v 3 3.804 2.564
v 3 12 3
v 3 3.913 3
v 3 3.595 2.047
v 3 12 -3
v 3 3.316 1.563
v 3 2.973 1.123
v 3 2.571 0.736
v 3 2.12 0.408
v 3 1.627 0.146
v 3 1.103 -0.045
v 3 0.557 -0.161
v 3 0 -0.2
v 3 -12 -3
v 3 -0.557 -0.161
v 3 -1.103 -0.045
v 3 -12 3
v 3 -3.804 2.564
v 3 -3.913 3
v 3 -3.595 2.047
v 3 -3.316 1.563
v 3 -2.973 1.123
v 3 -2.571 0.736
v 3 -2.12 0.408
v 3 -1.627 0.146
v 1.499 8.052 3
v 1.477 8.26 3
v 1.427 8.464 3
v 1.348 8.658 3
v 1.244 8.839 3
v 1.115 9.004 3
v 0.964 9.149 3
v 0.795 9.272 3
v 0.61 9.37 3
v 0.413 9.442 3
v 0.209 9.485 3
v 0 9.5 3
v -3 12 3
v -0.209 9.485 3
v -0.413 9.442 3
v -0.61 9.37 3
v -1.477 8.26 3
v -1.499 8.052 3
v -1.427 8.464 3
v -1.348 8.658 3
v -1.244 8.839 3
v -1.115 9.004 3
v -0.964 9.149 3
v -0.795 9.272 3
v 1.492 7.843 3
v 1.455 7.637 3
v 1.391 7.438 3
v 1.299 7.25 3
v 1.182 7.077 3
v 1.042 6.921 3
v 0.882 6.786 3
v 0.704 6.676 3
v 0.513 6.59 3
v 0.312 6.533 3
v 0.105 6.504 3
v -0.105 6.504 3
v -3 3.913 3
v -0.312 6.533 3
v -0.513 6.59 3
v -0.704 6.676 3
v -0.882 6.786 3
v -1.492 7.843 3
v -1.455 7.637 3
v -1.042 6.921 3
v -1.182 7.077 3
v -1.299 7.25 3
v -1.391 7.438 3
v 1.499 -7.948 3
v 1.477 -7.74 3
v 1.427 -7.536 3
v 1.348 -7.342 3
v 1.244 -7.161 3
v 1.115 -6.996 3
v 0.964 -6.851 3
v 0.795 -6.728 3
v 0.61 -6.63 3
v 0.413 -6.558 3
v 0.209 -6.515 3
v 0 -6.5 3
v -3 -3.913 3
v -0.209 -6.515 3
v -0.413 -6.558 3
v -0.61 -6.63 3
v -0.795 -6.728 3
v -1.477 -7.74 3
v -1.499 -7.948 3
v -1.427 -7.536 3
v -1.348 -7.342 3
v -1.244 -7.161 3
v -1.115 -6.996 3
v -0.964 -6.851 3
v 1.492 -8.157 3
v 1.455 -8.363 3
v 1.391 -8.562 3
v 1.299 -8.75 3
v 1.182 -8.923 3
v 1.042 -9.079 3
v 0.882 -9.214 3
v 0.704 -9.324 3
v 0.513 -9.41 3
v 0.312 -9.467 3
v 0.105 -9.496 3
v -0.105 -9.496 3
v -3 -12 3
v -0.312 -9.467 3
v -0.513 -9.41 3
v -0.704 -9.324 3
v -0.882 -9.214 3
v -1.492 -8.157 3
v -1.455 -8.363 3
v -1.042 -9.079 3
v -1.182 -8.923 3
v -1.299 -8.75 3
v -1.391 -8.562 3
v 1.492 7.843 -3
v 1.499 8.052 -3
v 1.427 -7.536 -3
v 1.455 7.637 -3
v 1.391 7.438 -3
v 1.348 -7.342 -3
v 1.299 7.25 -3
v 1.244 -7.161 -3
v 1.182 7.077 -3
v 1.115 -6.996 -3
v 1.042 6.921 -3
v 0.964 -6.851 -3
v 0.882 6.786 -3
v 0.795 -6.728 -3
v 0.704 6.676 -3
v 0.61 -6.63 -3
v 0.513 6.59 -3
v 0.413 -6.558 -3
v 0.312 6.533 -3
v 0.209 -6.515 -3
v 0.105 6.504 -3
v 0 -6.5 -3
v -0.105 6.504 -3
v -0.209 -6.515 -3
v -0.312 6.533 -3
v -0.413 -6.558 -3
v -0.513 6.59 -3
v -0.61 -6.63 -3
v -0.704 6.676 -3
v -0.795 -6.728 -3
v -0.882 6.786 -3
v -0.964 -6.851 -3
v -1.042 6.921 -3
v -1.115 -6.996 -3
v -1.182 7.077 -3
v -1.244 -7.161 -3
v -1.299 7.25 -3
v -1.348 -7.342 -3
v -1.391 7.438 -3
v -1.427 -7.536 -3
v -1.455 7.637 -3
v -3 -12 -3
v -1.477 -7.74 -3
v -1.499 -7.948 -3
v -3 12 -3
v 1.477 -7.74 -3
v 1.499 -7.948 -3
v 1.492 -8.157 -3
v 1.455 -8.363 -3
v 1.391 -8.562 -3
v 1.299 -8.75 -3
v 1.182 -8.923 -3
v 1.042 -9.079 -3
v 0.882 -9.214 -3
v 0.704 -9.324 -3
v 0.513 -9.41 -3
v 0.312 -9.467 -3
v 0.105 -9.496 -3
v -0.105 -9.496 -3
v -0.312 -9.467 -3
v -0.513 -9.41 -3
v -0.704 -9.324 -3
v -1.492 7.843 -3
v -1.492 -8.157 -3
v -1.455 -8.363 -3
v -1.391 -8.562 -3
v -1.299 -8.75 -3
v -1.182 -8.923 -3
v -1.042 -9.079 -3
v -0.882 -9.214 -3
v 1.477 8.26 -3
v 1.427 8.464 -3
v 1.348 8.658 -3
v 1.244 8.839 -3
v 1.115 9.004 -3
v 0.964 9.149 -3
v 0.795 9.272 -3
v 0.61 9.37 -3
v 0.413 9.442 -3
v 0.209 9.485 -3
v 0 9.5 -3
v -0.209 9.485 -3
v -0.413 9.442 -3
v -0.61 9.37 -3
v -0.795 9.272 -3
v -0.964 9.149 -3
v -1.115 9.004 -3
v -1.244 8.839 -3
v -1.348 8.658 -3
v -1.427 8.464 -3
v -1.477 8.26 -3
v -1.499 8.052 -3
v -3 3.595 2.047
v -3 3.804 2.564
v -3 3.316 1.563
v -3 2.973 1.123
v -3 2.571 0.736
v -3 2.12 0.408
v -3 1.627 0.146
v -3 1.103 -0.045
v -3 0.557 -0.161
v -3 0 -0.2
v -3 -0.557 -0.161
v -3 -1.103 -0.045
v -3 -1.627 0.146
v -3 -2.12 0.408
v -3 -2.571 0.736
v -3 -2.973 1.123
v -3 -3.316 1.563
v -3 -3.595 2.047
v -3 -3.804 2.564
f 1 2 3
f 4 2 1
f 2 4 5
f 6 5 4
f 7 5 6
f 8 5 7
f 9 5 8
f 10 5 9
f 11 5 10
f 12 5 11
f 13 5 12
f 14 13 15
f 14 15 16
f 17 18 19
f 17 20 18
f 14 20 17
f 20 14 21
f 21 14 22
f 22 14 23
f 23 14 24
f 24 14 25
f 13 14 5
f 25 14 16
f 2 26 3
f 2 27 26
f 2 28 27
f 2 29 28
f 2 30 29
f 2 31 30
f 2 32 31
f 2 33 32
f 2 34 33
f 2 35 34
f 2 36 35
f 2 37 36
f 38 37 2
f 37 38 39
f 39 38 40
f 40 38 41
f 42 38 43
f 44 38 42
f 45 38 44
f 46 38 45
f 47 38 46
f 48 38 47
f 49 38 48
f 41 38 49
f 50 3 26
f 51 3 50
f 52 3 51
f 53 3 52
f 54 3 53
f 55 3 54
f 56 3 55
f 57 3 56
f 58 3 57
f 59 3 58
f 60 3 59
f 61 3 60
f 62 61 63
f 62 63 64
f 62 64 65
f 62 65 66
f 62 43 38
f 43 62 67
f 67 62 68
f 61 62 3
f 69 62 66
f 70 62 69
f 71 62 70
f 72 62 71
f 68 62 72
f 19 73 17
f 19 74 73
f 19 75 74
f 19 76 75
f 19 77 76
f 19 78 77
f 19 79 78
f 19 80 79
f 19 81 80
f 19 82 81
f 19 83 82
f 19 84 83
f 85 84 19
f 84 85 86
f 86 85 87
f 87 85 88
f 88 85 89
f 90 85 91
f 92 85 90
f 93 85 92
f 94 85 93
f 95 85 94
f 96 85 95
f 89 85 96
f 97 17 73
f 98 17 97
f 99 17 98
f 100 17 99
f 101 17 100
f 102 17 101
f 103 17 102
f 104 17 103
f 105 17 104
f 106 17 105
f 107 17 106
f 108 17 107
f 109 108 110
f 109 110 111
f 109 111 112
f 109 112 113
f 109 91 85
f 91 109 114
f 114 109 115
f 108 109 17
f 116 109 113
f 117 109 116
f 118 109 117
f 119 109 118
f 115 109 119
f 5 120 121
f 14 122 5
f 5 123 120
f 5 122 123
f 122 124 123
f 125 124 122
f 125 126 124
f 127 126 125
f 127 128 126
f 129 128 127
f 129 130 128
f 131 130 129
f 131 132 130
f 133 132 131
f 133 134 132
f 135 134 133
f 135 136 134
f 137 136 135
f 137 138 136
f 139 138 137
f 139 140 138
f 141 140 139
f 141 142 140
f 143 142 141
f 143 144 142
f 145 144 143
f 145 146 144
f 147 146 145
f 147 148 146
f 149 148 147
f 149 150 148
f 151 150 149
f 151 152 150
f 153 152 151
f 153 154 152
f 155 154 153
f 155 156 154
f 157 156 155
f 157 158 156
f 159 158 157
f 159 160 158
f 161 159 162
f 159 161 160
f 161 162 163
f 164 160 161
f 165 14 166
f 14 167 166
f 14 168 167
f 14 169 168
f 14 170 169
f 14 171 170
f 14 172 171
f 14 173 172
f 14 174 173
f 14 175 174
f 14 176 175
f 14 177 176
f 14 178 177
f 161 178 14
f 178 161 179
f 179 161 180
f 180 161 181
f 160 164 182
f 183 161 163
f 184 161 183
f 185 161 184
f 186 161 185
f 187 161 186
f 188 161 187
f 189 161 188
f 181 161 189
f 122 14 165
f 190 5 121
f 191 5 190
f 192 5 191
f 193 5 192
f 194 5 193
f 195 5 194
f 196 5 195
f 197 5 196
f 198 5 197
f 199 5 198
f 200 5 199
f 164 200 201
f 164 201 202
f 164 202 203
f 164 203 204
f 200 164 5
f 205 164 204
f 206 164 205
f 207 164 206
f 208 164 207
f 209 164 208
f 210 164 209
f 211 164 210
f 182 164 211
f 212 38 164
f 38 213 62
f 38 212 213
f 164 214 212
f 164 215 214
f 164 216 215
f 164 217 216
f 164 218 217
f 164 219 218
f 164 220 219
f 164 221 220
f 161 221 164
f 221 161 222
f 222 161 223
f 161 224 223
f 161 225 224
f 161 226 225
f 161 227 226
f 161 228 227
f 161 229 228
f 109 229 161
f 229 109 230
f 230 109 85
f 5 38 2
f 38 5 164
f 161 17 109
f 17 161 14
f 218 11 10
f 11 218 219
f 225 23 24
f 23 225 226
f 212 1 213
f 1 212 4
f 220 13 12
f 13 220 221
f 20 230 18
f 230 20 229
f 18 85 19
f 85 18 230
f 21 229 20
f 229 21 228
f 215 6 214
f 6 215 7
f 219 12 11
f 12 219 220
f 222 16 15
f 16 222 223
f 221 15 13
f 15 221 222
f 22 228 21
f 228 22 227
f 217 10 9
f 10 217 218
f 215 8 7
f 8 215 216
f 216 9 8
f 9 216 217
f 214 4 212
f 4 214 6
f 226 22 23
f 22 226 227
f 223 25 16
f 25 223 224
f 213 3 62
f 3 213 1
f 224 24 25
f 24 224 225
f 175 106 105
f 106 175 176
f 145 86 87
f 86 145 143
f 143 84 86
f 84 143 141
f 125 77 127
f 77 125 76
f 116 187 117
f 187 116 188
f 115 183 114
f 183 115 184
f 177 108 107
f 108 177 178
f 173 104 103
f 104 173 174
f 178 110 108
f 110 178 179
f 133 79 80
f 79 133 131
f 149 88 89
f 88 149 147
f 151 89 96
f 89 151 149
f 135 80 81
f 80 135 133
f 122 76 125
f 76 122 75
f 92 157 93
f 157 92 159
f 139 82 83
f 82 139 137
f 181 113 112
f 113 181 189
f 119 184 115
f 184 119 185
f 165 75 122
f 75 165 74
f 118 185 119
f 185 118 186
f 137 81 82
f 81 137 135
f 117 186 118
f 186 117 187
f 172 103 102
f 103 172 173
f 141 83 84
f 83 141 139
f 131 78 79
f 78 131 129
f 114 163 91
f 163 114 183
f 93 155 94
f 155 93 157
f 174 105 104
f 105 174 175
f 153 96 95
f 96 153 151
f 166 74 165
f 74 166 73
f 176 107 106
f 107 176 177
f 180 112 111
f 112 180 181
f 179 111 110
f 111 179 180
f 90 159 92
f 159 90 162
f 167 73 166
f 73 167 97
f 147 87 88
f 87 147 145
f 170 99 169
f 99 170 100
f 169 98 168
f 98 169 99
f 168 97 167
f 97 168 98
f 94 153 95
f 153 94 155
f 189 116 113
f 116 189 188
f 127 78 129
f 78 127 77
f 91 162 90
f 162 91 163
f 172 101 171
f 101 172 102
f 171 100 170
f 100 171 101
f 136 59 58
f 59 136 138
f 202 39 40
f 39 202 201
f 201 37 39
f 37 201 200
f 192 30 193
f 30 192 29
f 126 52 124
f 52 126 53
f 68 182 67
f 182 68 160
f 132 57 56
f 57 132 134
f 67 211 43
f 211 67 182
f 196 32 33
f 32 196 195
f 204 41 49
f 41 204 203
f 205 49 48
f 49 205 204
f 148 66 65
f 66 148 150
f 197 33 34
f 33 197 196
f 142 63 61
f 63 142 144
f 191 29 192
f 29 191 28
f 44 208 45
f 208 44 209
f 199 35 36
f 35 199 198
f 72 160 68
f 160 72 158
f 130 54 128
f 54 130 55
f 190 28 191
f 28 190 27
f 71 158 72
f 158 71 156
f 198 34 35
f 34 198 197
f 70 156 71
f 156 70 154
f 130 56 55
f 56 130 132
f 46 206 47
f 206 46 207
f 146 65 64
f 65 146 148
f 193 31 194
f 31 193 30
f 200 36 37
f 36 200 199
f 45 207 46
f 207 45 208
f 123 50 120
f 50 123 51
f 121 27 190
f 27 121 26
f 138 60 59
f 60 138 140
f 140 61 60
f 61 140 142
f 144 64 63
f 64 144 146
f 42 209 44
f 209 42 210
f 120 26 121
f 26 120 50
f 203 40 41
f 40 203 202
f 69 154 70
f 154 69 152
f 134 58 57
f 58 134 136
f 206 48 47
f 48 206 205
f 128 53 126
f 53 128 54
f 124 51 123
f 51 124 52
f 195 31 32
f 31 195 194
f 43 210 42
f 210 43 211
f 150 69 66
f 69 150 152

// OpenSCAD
//*** Parametric cable clamp ***
//Bertrand Achard - December 21st 2012 - Creative Common attribution share alike.

//You can use two of them screwed together, or use one attached to the frame.
//The design assumes that the diameter of the screws is smaller than the cable.

//Diameter of the cable
cable_diam=8;
//Diameter of the 2 screws
screw_diam=3;
//How much you want the cable to be "pressed"
cable_press=cable_diam*0.1;

//The height of the cube (z axis)
cube_z=cable_diam*1.5;
//The depth of the cube (x axis), min=screw_diam+some margin
cube_x=screw_diam*4;
//The width of the cube (y axis), min=6
cube_y=cable_diam*6;

difference()
{
	cube([cube_x/2,cube_y/2,cube_z/2], true);

	translate([0,0,cube_z/4+cable_press])
		rotate([0,90,0])
			cylinder(h=cube_x, r1=cable_diam/2, r2=cable_diam/2, center=true, $fn=screw_diam*15);


	translate([0,-cube_y/8-cable_diam/4,0])
		rotate([0,0,90])
			cylinder(h=cube_z, r1=screw_diam/2, r2=screw_diam/2, center=true, $fn=screw_diam*15);

	translate([0,cube_y/8+cable_diam/4,0])
		rotate([0,0,90])
			cylinder(h=cube_z, r1=screw_diam/2, r2=screw_diam/2, center=true, $fn=screw_diam*15);
}
